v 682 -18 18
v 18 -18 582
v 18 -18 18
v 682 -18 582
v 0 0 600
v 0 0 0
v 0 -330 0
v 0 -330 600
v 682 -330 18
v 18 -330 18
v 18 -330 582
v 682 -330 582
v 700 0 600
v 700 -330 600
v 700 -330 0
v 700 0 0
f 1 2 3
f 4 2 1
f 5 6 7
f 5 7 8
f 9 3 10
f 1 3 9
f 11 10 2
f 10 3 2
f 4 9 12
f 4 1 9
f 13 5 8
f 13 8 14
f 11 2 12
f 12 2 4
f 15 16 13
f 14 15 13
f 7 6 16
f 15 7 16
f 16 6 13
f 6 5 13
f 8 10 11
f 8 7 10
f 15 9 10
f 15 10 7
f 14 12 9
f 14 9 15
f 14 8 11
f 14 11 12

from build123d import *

# Parameters (mm, degrees)
F0_W     = 44.8449254036
F0_H     = 34.0256392956
F1_DEPTH = 330
F2_DEPTH = 900
F3_DEPTH = 600
F4_T     = -18
F6_W     = 48.9012300968
F6_H     = 42.5849854946
F7_DEPTH = 330
F8_DEPTH = 700
F9_DEPTH = 600
F10_T    = -18


with BuildPart() as f1:
    # F0 (on Front) → F1 (new body)
    with BuildSketch(Plane.XZ):
        with Locations((22.4224627018, 17.0128196478)):
            Rectangle(F0_W, F0_H)
    extrude(amount=F1_DEPTH)

    # F2 (add): a face of the model
    f2_faces = [f1.faces().sort_by_distance(p)[0] for p in [
        (0, -165, 17.0128196478),
    ]]
    extrude(f2_faces, amount=-F2_DEPTH)

    # F3 (add): a face of the model
    f3_faces = [f1.faces().sort_by_distance(p)[0] for p in [
        (450, -165, 0),
    ]]
    extrude(f3_faces, amount=-F3_DEPTH)

    # F4
    f4_openings = [f1.faces().sort_by_distance(p)[0] for p in [
        (450, -330, 300),
    ]]
    offset(amount=F4_T, openings=f4_openings)


with BuildPart() as f7:
    # F6 (on Front) → F7 (new body)
    with BuildSketch(Plane.XZ):
        with Locations((24.4506150484, 21.2924927473)):
            Rectangle(F6_W, F6_H)
    extrude(amount=F7_DEPTH)

    # F8 (add): a face of the model
    f8_faces = [f7.faces().sort_by_distance(p)[0] for p in [
        (0, -165, 21.2924927473),
    ]]
    extrude(f8_faces, amount=-F8_DEPTH)

    # F9 (add): a face of the model
    f9_faces = [f7.faces().sort_by_distance(p)[0] for p in [
        (350, -165, 0),
    ]]
    extrude(f9_faces, amount=-F9_DEPTH)

    # F10
    f10_openings = [f7.faces().sort_by_distance(p)[0] for p in [
        (350, -330, 300),
    ]]
    offset(amount=F10_T, openings=f10_openings)


solid = f7.part
